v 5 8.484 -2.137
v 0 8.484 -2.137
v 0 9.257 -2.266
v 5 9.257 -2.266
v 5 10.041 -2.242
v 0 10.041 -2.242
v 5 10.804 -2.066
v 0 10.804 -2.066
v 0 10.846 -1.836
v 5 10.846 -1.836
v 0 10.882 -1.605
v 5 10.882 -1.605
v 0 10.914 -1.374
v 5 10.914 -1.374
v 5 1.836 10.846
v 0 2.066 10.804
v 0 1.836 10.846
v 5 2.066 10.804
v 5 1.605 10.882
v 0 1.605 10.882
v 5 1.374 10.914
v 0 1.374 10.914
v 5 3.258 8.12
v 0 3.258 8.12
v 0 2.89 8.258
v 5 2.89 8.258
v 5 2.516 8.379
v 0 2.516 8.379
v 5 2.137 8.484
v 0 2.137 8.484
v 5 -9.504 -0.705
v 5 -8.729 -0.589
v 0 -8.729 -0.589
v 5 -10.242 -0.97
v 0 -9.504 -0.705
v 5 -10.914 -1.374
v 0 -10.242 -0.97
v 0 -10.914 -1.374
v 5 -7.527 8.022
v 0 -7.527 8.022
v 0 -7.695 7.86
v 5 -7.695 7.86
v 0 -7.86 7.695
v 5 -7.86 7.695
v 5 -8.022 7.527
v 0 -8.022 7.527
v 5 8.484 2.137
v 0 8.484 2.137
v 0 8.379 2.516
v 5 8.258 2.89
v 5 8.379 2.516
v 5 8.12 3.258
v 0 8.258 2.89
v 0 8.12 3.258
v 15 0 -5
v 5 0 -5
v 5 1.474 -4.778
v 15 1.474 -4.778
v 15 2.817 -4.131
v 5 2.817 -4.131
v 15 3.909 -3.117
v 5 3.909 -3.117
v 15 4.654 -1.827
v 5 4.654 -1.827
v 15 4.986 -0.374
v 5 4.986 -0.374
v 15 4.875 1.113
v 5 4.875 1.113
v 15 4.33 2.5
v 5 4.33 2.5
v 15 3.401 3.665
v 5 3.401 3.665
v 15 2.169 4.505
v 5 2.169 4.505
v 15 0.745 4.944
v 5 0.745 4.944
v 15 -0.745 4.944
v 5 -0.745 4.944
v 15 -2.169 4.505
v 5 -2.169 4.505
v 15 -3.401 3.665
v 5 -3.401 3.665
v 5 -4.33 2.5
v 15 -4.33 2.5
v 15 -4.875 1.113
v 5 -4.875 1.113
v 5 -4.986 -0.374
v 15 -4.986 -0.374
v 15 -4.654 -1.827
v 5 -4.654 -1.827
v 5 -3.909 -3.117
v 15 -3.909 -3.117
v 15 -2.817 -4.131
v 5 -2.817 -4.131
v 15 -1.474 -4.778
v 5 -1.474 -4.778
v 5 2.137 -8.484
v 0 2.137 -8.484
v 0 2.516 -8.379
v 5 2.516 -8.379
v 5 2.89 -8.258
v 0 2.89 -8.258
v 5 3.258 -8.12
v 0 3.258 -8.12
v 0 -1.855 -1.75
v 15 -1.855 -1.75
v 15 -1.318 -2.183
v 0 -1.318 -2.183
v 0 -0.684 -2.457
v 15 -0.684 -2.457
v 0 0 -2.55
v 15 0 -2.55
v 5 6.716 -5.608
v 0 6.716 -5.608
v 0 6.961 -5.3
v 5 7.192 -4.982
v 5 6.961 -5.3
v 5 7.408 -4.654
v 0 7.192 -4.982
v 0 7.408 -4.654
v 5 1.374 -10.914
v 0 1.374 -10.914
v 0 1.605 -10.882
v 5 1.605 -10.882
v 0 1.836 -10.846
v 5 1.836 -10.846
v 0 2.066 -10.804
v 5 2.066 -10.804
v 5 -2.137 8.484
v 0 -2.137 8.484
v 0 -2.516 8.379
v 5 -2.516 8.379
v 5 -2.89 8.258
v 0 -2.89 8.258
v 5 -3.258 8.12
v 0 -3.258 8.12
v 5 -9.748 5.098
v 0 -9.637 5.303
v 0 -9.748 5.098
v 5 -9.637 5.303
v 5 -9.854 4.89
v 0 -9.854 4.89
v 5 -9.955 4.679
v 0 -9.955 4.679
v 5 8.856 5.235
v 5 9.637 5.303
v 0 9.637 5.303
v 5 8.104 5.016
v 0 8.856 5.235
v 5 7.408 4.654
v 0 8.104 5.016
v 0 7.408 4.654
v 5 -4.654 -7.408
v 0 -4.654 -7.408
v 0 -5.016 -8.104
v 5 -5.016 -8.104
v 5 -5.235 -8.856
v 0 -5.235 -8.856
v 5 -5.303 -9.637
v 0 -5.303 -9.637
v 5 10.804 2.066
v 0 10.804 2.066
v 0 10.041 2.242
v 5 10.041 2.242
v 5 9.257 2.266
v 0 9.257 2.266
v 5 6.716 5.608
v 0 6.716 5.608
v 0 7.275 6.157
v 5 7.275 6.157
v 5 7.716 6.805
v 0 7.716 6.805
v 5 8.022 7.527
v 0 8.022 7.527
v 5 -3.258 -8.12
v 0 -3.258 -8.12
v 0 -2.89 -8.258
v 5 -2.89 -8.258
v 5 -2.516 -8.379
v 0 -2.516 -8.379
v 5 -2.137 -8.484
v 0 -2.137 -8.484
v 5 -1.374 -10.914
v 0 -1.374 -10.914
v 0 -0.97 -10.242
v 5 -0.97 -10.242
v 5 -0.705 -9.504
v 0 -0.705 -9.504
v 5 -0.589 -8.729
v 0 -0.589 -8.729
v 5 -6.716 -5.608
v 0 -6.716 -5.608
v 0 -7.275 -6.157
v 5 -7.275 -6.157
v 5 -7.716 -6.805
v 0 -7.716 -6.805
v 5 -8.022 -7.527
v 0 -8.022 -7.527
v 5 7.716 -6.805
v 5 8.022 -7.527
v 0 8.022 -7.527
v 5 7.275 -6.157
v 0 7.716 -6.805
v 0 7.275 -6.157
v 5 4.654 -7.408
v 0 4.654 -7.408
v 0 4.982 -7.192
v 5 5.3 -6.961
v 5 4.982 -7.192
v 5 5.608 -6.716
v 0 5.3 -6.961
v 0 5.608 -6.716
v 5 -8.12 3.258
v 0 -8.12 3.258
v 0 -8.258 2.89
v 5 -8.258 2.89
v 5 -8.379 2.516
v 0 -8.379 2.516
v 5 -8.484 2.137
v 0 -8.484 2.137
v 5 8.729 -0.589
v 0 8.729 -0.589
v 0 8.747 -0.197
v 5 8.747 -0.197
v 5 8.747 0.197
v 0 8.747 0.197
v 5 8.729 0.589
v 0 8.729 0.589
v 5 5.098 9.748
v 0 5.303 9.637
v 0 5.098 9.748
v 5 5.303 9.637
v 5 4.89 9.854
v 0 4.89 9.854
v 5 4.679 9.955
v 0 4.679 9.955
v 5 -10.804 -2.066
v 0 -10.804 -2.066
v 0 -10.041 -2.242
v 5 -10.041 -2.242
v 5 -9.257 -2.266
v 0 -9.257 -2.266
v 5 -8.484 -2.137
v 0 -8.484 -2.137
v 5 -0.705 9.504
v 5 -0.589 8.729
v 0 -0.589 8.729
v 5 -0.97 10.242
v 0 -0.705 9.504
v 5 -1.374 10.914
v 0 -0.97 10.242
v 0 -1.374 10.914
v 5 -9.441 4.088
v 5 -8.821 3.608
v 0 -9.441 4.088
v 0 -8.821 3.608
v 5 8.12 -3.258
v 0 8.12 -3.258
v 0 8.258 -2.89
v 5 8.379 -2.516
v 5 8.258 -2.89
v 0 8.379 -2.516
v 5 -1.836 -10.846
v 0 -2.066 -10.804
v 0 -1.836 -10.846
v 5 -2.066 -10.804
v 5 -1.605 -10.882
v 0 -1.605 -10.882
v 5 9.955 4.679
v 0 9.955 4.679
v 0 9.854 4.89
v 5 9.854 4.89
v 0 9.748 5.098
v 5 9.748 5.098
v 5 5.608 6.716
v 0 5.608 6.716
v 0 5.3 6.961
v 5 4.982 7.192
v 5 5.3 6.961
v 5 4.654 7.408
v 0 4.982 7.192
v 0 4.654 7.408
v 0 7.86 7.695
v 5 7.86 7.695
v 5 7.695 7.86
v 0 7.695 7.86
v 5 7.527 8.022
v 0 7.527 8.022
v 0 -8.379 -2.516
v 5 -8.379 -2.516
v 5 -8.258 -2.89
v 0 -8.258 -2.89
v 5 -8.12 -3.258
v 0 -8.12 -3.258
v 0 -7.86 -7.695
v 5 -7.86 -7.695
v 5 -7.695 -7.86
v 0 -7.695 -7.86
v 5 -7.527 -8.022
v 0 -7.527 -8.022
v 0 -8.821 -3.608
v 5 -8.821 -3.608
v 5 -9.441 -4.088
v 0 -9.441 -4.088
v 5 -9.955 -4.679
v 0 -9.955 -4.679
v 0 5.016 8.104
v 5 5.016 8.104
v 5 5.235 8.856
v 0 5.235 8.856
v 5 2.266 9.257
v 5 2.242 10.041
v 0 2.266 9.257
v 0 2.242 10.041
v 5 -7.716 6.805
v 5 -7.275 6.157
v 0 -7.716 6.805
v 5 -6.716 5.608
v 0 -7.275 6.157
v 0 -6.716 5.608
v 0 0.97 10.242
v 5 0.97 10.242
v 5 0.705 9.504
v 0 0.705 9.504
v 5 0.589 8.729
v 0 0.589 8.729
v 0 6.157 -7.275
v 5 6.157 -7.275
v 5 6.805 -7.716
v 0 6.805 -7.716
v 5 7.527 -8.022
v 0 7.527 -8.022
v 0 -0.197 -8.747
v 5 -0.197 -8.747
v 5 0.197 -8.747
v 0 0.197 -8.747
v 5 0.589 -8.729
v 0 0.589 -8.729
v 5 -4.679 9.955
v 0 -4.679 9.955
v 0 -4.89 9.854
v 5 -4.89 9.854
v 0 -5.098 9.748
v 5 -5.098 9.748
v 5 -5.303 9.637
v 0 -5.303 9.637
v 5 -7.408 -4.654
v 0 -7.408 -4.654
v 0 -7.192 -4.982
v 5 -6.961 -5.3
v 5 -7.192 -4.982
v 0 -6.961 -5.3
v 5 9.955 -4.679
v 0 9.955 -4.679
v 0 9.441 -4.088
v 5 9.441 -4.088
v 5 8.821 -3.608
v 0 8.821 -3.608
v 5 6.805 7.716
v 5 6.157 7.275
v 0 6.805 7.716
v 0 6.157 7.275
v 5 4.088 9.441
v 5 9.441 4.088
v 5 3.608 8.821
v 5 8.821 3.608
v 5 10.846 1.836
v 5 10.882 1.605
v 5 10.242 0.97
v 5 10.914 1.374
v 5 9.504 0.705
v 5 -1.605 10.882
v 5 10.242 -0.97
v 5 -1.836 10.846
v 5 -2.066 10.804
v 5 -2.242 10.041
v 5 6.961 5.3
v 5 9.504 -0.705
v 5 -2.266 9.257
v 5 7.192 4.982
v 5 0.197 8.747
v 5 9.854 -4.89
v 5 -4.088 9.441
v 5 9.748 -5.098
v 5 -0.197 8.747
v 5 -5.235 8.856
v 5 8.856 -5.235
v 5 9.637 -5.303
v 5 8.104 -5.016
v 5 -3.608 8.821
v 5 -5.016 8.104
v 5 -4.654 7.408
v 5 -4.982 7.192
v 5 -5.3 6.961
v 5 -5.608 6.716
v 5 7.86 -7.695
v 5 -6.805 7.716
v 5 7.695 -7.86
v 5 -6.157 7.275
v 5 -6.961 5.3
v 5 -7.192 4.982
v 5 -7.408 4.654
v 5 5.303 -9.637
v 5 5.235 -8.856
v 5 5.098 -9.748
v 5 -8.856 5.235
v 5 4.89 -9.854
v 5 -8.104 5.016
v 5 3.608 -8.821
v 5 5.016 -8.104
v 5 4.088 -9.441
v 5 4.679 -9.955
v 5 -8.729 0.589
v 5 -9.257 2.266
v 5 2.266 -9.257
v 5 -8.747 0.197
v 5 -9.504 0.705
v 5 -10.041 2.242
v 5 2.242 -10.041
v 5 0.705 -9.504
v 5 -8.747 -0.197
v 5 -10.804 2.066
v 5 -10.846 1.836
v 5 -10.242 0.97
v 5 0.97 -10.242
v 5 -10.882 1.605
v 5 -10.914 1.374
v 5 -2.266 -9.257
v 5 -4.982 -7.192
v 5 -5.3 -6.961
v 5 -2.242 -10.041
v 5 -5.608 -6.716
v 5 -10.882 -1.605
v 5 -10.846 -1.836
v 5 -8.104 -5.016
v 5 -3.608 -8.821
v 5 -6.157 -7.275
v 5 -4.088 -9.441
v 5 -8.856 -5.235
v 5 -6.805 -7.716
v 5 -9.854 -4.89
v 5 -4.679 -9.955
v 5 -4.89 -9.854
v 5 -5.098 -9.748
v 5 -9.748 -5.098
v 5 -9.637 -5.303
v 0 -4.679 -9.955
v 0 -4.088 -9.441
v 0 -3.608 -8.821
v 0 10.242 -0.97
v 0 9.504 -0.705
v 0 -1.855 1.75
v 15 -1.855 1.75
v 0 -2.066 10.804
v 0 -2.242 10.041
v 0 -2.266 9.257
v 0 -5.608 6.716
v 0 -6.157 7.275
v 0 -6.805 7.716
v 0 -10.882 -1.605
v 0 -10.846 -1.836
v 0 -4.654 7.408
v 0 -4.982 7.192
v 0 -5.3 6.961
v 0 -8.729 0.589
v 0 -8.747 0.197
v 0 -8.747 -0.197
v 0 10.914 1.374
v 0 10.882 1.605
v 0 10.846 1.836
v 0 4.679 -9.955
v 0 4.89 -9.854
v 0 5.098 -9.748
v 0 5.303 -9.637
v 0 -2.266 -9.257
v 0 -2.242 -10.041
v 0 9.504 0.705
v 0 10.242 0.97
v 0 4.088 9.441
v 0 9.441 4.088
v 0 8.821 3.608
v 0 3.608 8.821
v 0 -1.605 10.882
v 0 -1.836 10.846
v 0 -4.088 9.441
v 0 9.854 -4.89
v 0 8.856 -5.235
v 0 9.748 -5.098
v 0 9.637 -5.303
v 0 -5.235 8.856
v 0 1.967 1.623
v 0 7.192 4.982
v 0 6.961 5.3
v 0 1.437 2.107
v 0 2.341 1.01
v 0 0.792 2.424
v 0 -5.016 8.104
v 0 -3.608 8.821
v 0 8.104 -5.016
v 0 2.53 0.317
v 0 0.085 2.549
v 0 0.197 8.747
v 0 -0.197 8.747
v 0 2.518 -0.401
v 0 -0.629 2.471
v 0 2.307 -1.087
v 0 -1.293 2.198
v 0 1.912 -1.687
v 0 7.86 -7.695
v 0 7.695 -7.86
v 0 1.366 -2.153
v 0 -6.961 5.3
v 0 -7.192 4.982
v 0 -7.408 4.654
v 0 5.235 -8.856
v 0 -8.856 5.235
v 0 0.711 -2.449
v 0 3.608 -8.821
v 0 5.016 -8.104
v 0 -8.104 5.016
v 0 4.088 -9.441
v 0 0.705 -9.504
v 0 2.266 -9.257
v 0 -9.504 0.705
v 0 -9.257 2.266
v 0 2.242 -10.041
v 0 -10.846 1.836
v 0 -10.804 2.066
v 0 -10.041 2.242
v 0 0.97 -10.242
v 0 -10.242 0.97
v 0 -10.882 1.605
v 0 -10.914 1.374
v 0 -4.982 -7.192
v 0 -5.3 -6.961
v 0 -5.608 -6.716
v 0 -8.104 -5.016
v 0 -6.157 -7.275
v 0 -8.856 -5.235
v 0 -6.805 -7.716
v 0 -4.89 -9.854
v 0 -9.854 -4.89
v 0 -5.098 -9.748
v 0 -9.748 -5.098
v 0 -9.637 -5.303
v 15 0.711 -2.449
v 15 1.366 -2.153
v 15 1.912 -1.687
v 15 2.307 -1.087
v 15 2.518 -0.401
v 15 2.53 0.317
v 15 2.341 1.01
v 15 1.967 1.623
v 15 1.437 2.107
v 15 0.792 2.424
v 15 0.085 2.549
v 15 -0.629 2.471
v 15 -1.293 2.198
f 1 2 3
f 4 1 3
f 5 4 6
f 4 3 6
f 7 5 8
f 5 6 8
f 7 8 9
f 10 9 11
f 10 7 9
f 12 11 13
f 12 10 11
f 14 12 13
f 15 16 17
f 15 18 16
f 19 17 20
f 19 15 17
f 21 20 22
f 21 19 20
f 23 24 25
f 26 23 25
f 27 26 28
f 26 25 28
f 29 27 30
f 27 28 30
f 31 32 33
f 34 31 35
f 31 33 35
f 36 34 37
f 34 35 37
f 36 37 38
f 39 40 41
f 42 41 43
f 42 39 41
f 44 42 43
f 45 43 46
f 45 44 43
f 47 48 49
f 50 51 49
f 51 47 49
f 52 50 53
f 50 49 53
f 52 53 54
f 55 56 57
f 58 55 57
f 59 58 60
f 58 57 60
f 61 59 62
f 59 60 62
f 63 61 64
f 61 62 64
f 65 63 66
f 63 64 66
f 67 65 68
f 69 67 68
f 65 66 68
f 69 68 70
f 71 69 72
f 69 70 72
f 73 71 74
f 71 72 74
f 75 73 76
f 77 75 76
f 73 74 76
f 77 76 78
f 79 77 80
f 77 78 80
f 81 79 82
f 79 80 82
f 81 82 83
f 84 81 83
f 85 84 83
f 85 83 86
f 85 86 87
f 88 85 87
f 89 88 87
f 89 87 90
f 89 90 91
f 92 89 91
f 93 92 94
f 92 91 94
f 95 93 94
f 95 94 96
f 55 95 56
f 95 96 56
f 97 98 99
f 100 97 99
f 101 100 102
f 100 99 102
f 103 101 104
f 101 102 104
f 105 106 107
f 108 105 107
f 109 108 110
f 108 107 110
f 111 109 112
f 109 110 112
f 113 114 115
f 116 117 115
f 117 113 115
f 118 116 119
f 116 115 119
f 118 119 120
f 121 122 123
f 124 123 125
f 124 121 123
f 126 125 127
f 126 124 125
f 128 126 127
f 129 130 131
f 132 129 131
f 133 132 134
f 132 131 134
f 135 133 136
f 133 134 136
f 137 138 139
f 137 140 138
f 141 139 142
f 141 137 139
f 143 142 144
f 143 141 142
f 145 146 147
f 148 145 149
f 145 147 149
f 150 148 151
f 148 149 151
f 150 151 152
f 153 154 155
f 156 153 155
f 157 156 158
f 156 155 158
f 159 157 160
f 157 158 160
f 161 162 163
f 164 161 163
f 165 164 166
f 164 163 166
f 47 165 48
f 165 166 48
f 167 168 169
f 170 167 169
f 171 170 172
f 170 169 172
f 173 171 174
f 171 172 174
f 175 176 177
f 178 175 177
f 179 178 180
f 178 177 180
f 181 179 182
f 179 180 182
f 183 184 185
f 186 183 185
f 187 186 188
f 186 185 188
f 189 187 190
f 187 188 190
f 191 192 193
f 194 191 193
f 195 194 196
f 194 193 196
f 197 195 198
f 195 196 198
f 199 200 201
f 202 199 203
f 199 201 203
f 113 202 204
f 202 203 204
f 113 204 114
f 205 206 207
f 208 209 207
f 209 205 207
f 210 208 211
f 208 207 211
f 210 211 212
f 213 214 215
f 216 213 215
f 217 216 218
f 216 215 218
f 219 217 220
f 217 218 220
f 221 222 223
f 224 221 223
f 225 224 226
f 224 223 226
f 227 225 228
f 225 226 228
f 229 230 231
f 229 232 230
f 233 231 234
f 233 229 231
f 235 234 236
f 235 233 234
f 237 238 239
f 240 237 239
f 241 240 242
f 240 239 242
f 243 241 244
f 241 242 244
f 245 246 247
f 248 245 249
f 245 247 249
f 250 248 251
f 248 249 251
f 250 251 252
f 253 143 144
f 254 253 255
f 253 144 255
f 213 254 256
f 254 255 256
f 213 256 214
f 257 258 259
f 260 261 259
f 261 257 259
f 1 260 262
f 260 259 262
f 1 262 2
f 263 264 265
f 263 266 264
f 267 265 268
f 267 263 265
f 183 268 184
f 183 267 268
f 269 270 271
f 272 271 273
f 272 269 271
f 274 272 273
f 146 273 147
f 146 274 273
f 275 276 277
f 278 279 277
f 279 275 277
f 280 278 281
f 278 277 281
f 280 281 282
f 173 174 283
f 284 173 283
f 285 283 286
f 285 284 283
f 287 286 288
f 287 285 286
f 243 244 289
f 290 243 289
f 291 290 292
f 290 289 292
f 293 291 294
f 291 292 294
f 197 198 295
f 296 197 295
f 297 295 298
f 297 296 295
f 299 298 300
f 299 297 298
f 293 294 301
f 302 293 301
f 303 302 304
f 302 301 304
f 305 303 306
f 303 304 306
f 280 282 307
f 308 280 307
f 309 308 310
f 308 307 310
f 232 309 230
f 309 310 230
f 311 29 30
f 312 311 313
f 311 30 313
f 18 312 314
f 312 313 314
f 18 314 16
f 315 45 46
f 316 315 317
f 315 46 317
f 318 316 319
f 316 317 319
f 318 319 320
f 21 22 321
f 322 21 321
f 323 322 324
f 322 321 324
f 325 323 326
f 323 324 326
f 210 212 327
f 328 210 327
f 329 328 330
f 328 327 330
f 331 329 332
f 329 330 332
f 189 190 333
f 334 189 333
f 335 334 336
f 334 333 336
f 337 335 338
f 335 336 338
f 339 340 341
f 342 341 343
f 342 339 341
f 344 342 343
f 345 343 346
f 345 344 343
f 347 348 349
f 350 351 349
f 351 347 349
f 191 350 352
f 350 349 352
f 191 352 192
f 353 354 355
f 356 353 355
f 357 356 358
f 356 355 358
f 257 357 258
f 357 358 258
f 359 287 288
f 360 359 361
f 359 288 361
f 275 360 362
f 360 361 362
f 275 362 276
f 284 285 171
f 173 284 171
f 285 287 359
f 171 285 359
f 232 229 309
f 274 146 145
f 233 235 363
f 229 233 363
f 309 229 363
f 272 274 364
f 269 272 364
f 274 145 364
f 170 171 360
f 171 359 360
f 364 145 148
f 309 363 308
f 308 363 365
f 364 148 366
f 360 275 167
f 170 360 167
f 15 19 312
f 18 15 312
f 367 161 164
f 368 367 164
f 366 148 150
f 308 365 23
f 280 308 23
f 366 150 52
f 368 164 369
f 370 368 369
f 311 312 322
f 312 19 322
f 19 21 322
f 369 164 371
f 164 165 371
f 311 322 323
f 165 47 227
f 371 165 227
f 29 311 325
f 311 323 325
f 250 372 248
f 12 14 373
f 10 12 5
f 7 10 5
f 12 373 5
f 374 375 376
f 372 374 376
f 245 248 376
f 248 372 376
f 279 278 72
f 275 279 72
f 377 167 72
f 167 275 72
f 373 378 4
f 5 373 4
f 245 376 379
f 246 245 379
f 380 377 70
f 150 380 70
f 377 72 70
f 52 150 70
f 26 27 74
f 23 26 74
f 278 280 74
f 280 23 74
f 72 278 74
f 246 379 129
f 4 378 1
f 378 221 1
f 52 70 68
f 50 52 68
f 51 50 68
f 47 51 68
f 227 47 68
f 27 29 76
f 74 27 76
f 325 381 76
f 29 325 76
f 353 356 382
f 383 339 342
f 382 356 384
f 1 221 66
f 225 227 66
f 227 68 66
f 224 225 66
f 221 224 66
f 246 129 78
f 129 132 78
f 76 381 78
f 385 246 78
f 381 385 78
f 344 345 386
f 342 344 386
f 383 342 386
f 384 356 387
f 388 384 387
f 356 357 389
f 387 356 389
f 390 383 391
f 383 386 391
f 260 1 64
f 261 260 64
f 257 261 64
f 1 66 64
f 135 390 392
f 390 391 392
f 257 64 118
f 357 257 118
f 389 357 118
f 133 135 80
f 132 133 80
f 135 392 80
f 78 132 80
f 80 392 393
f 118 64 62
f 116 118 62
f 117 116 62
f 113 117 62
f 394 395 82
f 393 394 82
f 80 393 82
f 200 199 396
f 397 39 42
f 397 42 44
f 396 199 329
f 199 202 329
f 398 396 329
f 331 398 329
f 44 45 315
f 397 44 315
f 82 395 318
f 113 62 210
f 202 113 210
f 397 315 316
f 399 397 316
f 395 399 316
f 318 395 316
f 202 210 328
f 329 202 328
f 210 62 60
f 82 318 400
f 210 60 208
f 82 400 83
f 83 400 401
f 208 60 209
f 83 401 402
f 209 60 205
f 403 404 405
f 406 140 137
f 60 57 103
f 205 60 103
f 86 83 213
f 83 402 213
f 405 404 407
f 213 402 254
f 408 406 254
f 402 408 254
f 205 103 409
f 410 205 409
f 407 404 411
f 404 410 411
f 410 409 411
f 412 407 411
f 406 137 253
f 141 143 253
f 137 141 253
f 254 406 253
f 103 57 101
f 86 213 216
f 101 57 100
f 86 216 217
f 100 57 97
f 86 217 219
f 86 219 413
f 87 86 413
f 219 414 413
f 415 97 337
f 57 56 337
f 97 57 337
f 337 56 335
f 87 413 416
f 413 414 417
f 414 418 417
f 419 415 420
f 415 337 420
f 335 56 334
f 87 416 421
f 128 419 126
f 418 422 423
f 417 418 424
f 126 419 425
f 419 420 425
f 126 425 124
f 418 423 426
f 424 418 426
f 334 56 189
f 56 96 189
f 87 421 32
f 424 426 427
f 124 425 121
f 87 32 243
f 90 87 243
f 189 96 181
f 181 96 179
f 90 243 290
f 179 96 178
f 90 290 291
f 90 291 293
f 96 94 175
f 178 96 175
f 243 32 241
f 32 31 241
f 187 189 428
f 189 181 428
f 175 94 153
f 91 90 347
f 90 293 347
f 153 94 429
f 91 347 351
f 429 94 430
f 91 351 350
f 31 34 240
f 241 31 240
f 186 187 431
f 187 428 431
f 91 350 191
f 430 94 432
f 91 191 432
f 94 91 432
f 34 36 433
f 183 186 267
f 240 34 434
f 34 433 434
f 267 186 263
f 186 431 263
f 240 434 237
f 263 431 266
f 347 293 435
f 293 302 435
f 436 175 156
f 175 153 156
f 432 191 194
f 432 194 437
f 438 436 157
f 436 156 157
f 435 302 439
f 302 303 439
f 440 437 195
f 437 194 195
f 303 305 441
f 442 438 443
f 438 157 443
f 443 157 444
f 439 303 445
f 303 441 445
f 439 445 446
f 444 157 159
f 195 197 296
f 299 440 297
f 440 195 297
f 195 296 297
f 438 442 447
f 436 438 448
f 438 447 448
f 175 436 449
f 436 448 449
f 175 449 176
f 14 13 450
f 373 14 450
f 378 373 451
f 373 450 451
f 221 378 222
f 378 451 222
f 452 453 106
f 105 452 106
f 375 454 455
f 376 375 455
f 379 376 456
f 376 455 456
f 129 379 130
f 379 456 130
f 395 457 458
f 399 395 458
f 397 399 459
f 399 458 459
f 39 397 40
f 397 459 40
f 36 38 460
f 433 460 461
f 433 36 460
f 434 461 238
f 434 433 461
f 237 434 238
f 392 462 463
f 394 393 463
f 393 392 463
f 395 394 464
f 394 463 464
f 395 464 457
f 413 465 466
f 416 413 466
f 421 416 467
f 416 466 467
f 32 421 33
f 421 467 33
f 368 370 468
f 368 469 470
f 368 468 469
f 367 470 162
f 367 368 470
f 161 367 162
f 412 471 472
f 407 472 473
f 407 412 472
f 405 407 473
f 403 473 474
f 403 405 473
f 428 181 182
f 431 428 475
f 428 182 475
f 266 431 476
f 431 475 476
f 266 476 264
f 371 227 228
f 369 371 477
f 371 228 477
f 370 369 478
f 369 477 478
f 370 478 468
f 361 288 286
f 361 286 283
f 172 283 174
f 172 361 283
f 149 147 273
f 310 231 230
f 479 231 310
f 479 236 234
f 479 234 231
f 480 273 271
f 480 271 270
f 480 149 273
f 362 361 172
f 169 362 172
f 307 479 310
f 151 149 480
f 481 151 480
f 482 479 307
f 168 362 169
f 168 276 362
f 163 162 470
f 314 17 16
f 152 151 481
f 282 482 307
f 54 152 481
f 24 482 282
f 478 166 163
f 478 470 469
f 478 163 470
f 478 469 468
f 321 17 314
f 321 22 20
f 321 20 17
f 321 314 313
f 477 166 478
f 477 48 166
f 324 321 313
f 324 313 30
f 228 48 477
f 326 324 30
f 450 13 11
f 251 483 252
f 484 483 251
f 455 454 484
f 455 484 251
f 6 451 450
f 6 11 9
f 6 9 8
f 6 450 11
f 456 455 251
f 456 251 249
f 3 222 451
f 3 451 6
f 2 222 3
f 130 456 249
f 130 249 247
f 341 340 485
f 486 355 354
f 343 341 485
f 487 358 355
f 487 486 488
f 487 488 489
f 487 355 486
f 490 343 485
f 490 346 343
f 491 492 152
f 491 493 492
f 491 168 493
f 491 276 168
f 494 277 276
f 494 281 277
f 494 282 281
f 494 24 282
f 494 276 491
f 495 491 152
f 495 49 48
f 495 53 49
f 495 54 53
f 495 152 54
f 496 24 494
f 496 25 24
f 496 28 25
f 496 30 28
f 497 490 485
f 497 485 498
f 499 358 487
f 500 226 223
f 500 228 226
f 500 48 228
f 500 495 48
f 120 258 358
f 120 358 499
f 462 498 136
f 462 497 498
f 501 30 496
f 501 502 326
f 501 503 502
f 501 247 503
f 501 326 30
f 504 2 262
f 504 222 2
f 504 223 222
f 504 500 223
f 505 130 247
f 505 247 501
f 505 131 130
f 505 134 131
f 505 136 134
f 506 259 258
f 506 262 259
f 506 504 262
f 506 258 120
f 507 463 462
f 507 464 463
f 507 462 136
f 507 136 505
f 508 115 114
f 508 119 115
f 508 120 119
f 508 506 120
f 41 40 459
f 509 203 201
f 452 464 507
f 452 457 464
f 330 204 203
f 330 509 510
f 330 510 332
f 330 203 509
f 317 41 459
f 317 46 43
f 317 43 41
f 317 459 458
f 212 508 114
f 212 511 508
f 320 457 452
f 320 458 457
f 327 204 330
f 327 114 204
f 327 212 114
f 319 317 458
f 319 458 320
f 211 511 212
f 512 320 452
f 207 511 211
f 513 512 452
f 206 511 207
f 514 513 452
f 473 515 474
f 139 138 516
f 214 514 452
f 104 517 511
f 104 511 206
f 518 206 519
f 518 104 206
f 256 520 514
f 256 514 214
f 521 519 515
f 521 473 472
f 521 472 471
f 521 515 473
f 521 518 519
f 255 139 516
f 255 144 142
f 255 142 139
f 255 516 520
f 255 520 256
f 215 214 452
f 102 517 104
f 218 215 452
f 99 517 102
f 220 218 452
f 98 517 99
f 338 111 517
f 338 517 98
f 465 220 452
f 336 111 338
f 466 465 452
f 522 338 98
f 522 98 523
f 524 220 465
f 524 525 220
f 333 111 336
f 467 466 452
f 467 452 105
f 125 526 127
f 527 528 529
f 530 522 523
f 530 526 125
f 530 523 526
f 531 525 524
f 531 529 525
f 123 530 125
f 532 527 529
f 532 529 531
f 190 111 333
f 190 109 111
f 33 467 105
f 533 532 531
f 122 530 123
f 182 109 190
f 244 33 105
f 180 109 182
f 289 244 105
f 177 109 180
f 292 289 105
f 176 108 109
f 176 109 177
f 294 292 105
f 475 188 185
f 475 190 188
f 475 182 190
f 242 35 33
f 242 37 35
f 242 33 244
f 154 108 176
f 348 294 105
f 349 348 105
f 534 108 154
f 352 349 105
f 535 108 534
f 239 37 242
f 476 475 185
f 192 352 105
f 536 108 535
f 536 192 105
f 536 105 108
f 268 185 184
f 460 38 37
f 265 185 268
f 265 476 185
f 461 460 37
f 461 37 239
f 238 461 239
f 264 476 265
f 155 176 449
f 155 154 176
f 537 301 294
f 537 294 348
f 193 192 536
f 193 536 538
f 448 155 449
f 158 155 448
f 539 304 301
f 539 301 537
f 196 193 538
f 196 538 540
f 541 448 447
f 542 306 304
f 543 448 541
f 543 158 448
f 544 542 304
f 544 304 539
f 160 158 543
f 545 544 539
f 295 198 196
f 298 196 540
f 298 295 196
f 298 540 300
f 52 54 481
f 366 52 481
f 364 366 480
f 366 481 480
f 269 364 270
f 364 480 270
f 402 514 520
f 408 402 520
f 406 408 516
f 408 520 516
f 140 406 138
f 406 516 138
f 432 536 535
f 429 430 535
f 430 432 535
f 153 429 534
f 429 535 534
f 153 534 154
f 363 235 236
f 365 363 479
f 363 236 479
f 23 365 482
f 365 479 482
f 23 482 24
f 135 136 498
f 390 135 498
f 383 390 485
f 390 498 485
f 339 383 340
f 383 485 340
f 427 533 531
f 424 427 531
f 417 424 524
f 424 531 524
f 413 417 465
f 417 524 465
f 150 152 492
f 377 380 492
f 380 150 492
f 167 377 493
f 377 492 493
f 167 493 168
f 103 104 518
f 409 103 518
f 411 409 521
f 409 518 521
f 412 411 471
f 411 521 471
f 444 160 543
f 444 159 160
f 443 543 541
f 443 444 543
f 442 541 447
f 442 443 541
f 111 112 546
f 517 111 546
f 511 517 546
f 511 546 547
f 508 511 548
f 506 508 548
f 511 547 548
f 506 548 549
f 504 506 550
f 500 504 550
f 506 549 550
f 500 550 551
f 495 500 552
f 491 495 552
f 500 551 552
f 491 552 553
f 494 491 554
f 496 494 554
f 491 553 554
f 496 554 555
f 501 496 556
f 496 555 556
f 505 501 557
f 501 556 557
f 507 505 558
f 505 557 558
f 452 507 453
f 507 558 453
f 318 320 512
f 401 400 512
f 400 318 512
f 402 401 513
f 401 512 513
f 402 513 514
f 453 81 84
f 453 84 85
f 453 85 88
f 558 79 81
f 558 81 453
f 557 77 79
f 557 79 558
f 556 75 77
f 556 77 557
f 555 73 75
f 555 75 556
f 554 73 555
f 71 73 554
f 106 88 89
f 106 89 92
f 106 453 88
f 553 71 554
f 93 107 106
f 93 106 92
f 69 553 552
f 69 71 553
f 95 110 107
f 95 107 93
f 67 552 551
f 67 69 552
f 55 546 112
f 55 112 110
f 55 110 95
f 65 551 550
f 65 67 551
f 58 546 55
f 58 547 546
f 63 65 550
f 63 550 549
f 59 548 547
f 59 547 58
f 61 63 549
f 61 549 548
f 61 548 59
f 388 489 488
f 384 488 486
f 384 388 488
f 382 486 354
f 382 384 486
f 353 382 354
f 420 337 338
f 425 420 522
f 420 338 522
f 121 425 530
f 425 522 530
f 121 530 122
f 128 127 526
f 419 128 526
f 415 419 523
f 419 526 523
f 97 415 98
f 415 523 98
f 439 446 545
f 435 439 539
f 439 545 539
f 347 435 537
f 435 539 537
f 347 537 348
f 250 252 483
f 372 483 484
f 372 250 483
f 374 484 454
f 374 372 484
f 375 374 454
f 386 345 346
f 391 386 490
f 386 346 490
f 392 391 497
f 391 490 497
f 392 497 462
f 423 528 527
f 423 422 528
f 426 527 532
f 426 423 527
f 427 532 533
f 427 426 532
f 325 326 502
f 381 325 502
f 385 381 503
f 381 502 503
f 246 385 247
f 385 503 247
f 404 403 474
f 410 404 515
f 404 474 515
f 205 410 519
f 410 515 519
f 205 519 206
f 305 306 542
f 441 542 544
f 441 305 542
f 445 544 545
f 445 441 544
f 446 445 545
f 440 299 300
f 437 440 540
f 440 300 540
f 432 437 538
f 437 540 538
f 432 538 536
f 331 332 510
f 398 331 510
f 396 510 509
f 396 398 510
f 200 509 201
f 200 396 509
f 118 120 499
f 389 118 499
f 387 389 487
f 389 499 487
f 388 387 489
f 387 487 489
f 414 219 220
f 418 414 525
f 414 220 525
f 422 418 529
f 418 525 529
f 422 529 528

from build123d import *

# Parameters (mm, degrees)
BASPROSKE_W              = 5
BASPROSKE_H              = 11
TOOTHCUT_DEPTH           = 17.340134638
TEETHCUTS_COUNT          = 20
TEETHCUTS_ANGLE          = 342
BORSKE_R                 = 2.5
BORE_DEPTH               = 50.0000508
SKETCH1_R                = 5
BOSS_EXTRUDE2_DEPTH      = 10
BOSS_EXTRUDE2_DEPTH_BACK = 5
CUT_EXTRUDE1_DEPTH       = 22.522623175


with BuildPart() as part:
    # BasProSke → Base-Revolve (revolve)
    with BuildSketch(Plane(origin=(0, 0, 0), x_dir=(1, 0, 0), z_dir=(0, 1, 0)), mode=Mode.PRIVATE) as base_revolve_sk:
        with Locations((2.5, 5.5)):
            Rectangle(BASPROSKE_W, BASPROSKE_H)
    revolve(base_revolve_sk.sketch.rotate(Axis((-10, 0, 0), (1, 0, 0)), 180), axis=Axis((-10, 0, 0), (1, 0, 0)))

    # TooCutSke → ToothCut (cut, through all)
    with BuildSketch(Plane(origin=(0, 0, 0), x_dir=(0, 0, -1), z_dir=(1, 0, 0))):
        with BuildLine():
            ThreePointArc((0.589353609, 8.729127295), (0, 8.749), (-0.589353609, 8.729127295))
            ThreePointArc((-0.589353609, 8.729127295), (-0.82475631, 9.893403384), (-1.391689312, 10.937213814))
            ThreePointArc((-1.391689312, 10.937213814), (0, 11.0254), (1.391689312, 10.937213814))
            ThreePointArc((1.391689312, 10.937213814), (0.82475631, 9.893403384), (0.589353609, 8.729127295))
        make_face()
    toothcut = extrude(amount=TOOTHCUT_DEPTH, mode=Mode.SUBTRACT)

    # TeethCuts: ToothCut ×20 about axis
    teethcuts_axis = Axis((-10, 0, 0), (1, 0, 0))
    for i in range(1, TEETHCUTS_COUNT):
        add(toothcut.rotate(teethcuts_axis, i * TEETHCUTS_ANGLE / (TEETHCUTS_COUNT - 1)), mode=Mode.SUBTRACT)

    # BorSke → Bore (cut, symmetric)
    with BuildSketch(Plane(origin=(0, 0, 0), x_dir=(0, 0, -1), z_dir=(1, 0, 0))):
        with Locations(Location((0, 0, 0), (0, 0, 180))):
            Circle(BORSKE_R)
    extrude(amount=BORE_DEPTH, both=True, mode=Mode.SUBTRACT)

    # Sketch1 → Boss-Extrude2 (add, two sides)
    with BuildSketch(Plane(origin=(5, 0, 0), x_dir=(0, 0, -1), z_dir=(1, 0, 0))) as boss_extrude2_sk:
        Circle(SKETCH1_R)
    extrude(amount=BOSS_EXTRUDE2_DEPTH)
    extrude(boss_extrude2_sk.sketch, amount=-BOSS_EXTRUDE2_DEPTH_BACK)

    # Sketch2 → Cut-Extrude1 (cut, through all)
    with BuildSketch(Plane(origin=(15, 0, 0), x_dir=(0, 0, -1), z_dir=(1, 0, 0))):
        with BuildLine():
            ThreePointArc((2.55, 0), (-1.009950494, 2.341473895), (-1.75, -1.854723699))
            Line((-1.75, -1.854723699), (1.75, -1.854723699))
            ThreePointArc((1.75, -1.854723699), (2.341473895, -1.009950494), (2.55, 0))
        make_face()
    extrude(amount=-CUT_EXTRUDE1_DEPTH, mode=Mode.SUBTRACT)


solid = part.part
